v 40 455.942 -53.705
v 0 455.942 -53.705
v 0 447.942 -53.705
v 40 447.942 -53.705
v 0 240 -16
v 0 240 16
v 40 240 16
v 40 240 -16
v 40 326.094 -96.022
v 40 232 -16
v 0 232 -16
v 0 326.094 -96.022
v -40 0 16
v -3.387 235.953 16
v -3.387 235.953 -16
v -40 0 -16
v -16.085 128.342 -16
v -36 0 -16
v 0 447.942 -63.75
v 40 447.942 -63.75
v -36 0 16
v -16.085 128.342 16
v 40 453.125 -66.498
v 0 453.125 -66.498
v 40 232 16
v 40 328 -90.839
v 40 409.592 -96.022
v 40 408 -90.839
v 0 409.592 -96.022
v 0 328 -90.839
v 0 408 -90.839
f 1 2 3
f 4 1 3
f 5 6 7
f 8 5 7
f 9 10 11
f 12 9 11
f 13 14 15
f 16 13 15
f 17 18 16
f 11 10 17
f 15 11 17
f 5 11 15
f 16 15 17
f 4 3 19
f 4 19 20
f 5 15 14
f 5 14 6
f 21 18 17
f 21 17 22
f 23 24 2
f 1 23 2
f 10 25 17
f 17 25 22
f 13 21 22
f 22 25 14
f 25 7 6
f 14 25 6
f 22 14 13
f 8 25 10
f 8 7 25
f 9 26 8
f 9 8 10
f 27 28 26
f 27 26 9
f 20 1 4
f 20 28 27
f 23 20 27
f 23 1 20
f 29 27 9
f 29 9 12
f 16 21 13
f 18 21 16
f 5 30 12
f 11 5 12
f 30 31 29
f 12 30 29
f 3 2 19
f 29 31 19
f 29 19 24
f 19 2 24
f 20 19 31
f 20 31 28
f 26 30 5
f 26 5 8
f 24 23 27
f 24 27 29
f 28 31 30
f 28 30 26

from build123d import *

# Parameters (mm, degrees)
SKETCH_9_W          = 32
SKETCH_9_H          = 240
EXTRUDE_4_DEPTH     = 8
EXTRUDE_5_DEPTH     = 32
SKETCH_11_W         = 40
SKETCH_11_H         = 8
EXTRUDE_6_DEPTH     = 40
SKETCH_14_W         = 4
SKETCH_14_H         = 32
SKETCH_16_W         = 49.074899356
SKETCH_16_H         = 238.21753212
CUT_EXTRUDE_1_DEPTH = 40
EXTRUDE_7_DEPTH     = 32


with BuildPart() as part:
    # 草图9 → 凸台-拉伸4 (new body)
    with BuildSketch(Plane(origin=(0, 0, 0), x_dir=(0, 0, -1), z_dir=(1, 0, 0))):
        with Locations((0, 120)):
            Rectangle(SKETCH_9_W, SKETCH_9_H)
    extrude(amount=EXTRUDE_4_DEPTH)

    # 草图10 → 凸台-拉伸5 (add)
    with BuildSketch(Plane.XY.offset(16)):
        Polygon((40, 232), (8, 120), (8, 232), (8, 240), (40, 240), align=None)
    extrude(amount=-EXTRUDE_5_DEPTH)

    # 扫描8: sweep along a path in 草图12
    with BuildLine(Plane.ZY) as sweep_8_path:
        Line((-16, 240), (-90.839227599, 328))
        Line((-90.839227599, 328), (-90.839227599, 408))
        Line((-90.839227599, 408), (-63.750419078, 447.942286341))
        Line((-63.750419078, 447.942286341), (-53.704847623, 447.942286341))
    # 草图11 → 扫描8 (sweep)
    with BuildSketch(Plane(origin=(0, 0, -16), x_dir=(-1, 0, 0), z_dir=(0, 0, -1))):
        with Locations((-20, 236)):
            Rectangle(SKETCH_11_W, SKETCH_11_H)
    sweep(path=sweep_8_path.line, transition=Transition.RIGHT)

    # 草图13 → 凸台-拉伸6 (add)
    with BuildSketch(Plane.ZY):
        Polygon((-66.49773312, 453.125050648), (-53.704847623, 455.942286341), (-53.704847623, 447.942286341), (-63.750419078, 447.942286341), align=None)
    extrude(amount=-EXTRUDE_6_DEPTH)

    # 扫描9: sweep along a path in 草图15
    with BuildLine(Plane.XY.offset(16)) as sweep_9_path:
        Line((-36, 0), (0, 232))
        Line((0, 232), (40, 232))
    # 草图14 → 扫描9 (sweep)
    with BuildSketch(Plane.XZ):
        with Locations((-38, 0)):
            Rectangle(SKETCH_14_W, SKETCH_14_H)
    sweep(path=sweep_9_path.line, transition=Transition.RIGHT)

    # 草图16 → 切除-拉伸1 (cut)
    with BuildSketch(Plane.XY.offset(16)):
        with Locations((24.537449678, 112.89123394)):
            Rectangle(SKETCH_16_W, SKETCH_16_H)
    extrude(amount=-CUT_EXTRUDE_1_DEPTH, mode=Mode.SUBTRACT)

    # 草图17 → 凸台-拉伸7 (add)
    with BuildSketch(Plane.XY.offset(16)):
        Polygon((-3.386650681, 235.952695613), (0, 240), (40, 240), (40, 232), (-21.69332534, 117.976347807), align=None)
    extrude(amount=-EXTRUDE_7_DEPTH)


solid = part.part
